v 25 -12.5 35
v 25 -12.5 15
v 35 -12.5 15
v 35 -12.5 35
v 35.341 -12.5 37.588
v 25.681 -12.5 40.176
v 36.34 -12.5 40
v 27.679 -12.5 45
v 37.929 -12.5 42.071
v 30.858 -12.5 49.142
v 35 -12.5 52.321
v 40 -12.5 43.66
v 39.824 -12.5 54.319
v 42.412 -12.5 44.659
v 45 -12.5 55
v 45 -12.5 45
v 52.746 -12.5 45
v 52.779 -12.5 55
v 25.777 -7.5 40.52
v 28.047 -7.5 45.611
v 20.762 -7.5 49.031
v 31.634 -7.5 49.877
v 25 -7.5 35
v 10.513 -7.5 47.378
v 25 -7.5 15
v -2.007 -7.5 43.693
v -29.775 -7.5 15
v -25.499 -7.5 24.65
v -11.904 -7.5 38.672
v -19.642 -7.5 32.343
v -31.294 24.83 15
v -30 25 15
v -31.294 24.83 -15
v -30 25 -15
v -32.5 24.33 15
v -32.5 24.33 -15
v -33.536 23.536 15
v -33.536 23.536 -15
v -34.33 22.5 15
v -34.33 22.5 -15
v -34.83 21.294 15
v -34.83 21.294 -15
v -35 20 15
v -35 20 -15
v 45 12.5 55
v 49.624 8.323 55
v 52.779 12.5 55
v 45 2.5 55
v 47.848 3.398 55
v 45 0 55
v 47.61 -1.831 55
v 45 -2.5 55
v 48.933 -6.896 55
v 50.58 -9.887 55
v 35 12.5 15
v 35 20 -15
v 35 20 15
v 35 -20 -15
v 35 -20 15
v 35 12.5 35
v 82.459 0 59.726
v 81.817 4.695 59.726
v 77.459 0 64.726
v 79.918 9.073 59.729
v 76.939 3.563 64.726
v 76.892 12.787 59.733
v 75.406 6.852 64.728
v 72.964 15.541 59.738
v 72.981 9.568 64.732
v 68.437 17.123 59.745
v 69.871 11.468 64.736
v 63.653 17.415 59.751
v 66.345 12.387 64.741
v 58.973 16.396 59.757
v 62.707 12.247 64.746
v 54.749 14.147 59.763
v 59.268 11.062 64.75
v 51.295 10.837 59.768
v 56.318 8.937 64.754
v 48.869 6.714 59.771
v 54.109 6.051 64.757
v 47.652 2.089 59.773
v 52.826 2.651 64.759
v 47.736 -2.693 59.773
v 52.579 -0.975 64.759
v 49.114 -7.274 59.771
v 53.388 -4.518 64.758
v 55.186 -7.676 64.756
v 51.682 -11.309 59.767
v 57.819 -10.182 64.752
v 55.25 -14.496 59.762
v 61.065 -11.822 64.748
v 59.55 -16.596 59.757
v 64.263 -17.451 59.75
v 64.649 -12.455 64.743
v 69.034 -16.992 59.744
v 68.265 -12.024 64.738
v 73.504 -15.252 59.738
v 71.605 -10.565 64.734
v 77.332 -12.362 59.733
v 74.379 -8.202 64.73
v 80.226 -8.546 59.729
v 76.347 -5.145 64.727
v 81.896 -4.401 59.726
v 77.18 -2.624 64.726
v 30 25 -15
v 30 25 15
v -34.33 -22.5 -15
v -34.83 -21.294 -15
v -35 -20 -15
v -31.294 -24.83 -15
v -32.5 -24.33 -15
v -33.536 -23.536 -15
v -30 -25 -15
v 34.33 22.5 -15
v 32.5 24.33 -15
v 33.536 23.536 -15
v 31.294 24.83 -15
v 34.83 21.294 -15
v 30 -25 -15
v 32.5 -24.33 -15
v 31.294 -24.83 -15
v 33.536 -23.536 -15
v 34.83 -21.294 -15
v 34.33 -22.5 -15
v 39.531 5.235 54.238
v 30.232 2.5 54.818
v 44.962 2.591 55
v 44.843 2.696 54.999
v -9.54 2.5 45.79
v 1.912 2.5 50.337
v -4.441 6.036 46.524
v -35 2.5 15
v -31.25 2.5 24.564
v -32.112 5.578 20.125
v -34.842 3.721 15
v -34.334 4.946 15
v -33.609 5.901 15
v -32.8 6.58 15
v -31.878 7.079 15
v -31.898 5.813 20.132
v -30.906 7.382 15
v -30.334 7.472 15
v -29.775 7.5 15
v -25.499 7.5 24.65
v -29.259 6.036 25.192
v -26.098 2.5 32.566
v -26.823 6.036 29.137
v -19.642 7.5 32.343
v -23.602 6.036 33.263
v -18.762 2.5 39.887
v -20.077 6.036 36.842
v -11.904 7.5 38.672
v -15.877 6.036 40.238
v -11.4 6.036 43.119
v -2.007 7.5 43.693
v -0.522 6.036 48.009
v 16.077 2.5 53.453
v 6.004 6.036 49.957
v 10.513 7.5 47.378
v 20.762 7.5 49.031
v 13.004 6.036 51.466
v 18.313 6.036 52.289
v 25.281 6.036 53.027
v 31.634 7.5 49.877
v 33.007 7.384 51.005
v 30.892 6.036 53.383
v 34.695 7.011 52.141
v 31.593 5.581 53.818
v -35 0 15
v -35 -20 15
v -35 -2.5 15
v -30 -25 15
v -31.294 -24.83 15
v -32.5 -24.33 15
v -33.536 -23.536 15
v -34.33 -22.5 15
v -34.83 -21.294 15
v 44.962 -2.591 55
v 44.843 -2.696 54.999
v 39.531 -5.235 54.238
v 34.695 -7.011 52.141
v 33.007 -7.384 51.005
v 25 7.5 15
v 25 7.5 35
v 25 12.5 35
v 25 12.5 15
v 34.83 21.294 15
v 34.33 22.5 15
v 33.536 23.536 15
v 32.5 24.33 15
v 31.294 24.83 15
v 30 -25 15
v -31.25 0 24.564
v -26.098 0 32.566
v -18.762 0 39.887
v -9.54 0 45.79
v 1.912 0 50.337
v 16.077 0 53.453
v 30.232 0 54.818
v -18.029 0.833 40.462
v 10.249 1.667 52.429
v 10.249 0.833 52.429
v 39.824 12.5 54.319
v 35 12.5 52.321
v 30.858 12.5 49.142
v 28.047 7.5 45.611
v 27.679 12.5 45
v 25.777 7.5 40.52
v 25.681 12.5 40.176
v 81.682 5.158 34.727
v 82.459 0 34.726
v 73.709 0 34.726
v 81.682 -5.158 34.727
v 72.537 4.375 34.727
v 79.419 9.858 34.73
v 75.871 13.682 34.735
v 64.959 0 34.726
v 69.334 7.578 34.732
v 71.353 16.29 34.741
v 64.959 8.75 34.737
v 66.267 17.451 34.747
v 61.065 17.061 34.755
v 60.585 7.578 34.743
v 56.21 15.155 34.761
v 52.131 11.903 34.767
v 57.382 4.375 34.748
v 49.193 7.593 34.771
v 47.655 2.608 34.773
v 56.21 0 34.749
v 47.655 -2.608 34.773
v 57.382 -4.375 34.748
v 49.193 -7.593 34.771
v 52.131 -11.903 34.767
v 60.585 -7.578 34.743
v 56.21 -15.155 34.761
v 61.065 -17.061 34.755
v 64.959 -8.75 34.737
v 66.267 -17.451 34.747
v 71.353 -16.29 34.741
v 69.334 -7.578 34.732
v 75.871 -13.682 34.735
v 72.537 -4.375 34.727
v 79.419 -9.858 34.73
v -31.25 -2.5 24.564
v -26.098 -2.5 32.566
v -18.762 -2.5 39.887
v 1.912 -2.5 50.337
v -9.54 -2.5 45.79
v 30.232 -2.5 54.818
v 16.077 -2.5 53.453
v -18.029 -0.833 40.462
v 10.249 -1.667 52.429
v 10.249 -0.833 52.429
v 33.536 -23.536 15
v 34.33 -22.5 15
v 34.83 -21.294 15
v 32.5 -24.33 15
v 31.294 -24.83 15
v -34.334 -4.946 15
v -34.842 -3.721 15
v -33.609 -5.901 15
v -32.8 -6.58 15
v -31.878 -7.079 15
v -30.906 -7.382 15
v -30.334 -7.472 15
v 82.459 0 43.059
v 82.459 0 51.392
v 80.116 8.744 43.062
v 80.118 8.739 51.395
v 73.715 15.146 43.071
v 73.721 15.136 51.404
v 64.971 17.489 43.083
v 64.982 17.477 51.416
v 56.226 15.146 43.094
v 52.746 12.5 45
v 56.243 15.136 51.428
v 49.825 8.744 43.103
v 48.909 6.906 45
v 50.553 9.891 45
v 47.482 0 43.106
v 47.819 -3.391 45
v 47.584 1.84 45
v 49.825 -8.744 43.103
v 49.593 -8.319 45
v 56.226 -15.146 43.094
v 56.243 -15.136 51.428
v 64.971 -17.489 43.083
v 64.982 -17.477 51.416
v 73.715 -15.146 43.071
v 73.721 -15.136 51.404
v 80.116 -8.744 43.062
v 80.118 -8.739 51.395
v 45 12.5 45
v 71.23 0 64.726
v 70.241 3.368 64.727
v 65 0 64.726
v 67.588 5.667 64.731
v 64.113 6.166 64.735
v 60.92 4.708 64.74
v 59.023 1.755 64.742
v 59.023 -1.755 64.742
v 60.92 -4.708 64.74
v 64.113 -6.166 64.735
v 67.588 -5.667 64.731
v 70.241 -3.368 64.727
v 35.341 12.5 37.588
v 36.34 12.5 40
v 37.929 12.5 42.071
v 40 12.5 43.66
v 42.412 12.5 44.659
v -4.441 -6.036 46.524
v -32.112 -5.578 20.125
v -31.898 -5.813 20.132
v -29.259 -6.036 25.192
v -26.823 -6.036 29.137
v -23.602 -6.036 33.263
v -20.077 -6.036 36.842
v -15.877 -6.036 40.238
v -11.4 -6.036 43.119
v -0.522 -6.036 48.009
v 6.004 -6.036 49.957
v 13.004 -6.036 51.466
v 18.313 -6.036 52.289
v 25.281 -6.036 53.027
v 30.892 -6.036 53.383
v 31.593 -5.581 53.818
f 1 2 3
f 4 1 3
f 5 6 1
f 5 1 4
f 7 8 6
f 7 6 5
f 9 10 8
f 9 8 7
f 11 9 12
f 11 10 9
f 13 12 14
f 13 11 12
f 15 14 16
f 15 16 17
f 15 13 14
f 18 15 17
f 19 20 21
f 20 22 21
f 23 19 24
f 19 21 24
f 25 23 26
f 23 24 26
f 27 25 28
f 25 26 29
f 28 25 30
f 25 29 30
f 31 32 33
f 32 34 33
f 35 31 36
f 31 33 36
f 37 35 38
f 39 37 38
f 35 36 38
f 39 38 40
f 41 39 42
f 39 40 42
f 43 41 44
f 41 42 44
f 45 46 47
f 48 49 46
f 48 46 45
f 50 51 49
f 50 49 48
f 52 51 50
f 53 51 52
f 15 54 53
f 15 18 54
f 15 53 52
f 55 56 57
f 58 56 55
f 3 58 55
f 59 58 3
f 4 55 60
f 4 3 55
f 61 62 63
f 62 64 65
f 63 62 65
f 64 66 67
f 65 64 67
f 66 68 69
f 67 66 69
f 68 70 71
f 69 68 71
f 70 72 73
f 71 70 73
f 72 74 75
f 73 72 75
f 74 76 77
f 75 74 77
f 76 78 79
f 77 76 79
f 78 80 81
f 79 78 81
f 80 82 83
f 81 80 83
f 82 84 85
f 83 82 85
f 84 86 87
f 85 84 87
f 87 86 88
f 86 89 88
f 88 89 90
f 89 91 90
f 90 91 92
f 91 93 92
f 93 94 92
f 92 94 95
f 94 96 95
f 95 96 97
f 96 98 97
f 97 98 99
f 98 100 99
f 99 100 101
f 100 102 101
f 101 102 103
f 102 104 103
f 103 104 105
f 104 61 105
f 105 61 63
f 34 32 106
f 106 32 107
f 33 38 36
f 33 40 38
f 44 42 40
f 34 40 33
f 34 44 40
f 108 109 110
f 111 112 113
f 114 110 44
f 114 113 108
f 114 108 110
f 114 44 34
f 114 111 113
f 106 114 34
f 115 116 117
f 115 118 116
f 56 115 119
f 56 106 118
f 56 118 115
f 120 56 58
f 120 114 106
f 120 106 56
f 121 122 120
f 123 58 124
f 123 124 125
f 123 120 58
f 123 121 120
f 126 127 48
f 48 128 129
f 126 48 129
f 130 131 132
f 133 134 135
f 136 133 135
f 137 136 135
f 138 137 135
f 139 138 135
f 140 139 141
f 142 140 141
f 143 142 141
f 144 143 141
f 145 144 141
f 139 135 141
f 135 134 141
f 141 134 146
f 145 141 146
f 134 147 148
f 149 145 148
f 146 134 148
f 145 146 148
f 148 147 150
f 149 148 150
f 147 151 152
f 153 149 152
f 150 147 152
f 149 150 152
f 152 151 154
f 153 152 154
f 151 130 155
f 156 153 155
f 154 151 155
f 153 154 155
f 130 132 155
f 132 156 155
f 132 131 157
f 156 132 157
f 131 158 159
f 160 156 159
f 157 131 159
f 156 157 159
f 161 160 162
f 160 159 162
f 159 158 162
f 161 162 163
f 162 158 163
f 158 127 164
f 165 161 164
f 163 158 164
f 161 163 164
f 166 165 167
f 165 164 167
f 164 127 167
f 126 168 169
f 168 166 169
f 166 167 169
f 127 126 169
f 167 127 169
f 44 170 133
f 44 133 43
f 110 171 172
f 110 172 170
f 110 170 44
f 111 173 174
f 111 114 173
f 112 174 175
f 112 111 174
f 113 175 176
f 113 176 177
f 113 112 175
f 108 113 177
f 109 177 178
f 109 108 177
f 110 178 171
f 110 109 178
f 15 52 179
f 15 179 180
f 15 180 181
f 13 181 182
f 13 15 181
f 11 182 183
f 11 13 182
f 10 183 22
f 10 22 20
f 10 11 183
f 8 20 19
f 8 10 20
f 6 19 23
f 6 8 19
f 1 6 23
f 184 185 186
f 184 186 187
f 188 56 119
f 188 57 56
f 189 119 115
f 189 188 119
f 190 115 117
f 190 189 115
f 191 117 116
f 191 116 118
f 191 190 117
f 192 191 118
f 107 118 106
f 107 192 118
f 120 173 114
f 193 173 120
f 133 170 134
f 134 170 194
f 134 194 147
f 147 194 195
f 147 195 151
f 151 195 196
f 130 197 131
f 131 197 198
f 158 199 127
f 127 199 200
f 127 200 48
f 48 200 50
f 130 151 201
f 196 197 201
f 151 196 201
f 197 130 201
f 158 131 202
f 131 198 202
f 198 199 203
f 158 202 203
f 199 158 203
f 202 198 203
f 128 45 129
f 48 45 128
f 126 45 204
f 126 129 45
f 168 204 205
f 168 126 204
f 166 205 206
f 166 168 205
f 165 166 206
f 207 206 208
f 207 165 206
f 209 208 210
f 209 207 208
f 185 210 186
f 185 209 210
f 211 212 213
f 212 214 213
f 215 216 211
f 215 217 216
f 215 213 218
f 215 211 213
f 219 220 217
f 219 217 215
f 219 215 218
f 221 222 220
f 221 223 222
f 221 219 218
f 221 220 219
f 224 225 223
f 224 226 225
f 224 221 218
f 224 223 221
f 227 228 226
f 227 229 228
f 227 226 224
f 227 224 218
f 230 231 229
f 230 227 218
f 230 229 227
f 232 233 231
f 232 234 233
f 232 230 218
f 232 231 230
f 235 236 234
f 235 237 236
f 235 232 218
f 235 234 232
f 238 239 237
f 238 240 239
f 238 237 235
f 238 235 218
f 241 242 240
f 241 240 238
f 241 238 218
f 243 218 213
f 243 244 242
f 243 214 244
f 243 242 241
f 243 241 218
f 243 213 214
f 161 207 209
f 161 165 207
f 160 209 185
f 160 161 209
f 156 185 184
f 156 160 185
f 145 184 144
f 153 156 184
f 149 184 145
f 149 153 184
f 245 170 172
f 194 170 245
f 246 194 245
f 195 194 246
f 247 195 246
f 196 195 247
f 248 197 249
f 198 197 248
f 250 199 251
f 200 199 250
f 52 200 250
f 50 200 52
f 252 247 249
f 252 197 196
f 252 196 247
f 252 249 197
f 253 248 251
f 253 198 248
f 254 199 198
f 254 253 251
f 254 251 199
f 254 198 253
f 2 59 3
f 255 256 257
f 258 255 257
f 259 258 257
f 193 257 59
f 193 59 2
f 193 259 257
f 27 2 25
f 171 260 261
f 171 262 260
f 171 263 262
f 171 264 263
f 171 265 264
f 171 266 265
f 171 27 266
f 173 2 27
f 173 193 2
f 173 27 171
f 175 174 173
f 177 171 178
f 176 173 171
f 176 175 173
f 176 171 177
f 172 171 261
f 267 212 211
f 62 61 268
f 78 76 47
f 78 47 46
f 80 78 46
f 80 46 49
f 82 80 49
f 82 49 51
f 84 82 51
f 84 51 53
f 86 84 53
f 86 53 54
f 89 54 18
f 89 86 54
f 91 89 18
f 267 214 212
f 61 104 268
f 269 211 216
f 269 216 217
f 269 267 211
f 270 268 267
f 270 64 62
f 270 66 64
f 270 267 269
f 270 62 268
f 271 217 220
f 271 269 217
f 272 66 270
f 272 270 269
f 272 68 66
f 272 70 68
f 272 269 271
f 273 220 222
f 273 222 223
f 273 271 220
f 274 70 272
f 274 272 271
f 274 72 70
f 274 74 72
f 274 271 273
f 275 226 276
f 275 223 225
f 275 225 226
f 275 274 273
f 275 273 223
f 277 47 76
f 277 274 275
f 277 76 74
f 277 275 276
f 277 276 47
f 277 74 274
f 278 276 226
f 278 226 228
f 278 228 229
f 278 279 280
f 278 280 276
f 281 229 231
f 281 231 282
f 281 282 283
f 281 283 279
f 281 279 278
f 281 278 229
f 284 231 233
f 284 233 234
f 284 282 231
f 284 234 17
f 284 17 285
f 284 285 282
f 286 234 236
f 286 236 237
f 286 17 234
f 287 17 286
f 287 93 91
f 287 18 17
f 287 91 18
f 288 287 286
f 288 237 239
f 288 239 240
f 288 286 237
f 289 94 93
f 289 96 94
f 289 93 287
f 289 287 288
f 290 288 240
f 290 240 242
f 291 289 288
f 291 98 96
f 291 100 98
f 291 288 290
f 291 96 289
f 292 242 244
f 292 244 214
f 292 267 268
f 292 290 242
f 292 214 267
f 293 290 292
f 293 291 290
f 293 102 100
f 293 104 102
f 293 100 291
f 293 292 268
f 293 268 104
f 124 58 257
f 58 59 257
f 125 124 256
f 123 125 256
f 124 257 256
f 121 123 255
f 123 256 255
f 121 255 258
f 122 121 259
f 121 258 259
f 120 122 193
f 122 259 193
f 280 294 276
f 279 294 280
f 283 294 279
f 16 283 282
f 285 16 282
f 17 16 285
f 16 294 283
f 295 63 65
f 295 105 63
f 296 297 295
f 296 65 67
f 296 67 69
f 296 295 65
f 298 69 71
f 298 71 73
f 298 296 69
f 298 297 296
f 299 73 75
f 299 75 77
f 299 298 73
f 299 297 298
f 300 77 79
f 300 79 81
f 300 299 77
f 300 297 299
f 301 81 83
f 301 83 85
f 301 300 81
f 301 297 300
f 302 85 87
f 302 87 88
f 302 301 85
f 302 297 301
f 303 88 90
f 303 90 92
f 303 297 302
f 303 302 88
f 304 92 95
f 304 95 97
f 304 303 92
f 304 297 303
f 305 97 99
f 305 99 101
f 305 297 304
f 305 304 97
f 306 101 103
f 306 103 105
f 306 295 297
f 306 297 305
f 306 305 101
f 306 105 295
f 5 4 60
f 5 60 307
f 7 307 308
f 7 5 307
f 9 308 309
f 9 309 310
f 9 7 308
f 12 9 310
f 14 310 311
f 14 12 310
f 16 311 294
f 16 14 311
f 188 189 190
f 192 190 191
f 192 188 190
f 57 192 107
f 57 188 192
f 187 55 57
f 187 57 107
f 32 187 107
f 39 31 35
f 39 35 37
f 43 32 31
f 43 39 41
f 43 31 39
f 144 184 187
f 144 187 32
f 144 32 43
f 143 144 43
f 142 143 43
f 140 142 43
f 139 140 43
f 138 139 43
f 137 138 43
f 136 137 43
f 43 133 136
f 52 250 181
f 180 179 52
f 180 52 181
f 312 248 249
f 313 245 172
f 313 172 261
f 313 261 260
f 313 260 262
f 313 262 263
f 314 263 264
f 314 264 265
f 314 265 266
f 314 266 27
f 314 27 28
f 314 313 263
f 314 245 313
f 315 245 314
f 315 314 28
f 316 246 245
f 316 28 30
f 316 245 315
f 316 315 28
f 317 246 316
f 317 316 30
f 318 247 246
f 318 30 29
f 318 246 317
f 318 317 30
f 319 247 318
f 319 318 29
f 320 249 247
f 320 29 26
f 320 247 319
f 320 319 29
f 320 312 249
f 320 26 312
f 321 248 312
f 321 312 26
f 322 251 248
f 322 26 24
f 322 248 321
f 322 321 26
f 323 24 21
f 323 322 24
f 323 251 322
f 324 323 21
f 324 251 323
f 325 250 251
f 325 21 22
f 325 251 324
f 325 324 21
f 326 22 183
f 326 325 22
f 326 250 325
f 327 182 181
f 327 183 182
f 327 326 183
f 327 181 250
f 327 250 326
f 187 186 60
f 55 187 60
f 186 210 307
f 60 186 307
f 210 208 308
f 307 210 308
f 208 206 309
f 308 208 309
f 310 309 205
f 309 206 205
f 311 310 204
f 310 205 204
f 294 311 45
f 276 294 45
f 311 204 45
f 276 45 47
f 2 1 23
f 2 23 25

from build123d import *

# Parameters (mm, degrees)
F1_DEPTH = 25
F2_DEPTH = 7.5
F3_DEPTH = 12.5
F4_DEPTH = 12.5
F6_R     = 5
F7_SIZE  = 5


with BuildPart() as f1:
    # F0 (on Front) → F1 (new body, symmetric)
    with BuildSketch(Plane.XZ):
        Polygon((25, 15), (-35, 15), (-35, -15), (35, -15), (35, 15), align=None)
    extrude(amount=F1_DEPTH, both=True)

    # F0 (on Front) → F2 (join, symmetric)
    with BuildSketch(Plane.XZ):
        with BuildLine():
            add(Edge.make_bspline(
                [(-35, 15), (-25.293957442, 48.5758967698), (8.6229406297, 55.761680007), (45, 55)],
                knots=[0, 0, 0, 0, 89.4427191, 89.4427191, 89.4427191, 89.4427191], degree=3))
            Line((-35, 15), (25, 15))
            Line((25, 15), (25, 35))
            ThreePointArc((25, 35), (30.8578643763, 49.1421356237), (45, 55))
        make_face()
    extrude(amount=F2_DEPTH, both=True)

    # F0 (on Front) → F3 (join, symmetric)
    with BuildSketch(Plane.XZ):
        with BuildLine():
            Line((25, 35), (25, 15))
            Line((25, 15), (35, 15))
            Line((35, 15), (35, 35))
            ThreePointArc((35, 35), (37.9289321881, 42.0710678119), (45, 45))
            Line((45, 45), (47.4594813585, 45))
            Line((47.4594813585, 45), (47.4594813585, 55))
            Line((47.4594813585, 55), (45, 55))
            ThreePointArc((45, 55), (30.8578643763, 49.1421356237), (25, 35))
        make_face()
    extrude(amount=F3_DEPTH, both=True)

    # F0 (on Front) → F4 (join, symmetric)
    with BuildSketch(Plane.XZ):
        Polygon((64.9868643671, 55), (47.4594813585, 55), (47.4594813585, 45), (64.9733581532, 45), align=None)
    extrude(amount=F4_DEPTH, both=True)

    # F0 (on Front) → F5 (revolve)
    with BuildSketch(Plane.XZ):
        Polygon((65, 64.7256219387), (64.9868643671, 55), (64.9733581532, 45), (64.9594813585, 34.7256219387), (82.4594813585, 34.7256219387), (82.4594813585, 64.7256219387), align=None)
    revolve(axis=Axis((64.9797406793, 0, 49.7256219387), (0.0013506202, 0, 0.9999990879)))

    # F6
    f6_edges = [f1.edges().sort_by_distance(p)[0] for p in [
        (35, -25, 0),
        (-35, -25, 0),
        (-35, 25, 0),
        (35, 25, 0),
        (-2.822986, -7.5, 48.736199),
        (-2.822986, 7.5, 48.736199),
    ]]
    fillet(f6_edges, radius=F6_R)

    # F7
    f7_edges = [f1.edges().sort_by_distance(p)[0] for p in [
        (47.540582, 0, 64.772784),
    ]]
    chamfer(f7_edges, length=F7_SIZE)


solid = f1.part
